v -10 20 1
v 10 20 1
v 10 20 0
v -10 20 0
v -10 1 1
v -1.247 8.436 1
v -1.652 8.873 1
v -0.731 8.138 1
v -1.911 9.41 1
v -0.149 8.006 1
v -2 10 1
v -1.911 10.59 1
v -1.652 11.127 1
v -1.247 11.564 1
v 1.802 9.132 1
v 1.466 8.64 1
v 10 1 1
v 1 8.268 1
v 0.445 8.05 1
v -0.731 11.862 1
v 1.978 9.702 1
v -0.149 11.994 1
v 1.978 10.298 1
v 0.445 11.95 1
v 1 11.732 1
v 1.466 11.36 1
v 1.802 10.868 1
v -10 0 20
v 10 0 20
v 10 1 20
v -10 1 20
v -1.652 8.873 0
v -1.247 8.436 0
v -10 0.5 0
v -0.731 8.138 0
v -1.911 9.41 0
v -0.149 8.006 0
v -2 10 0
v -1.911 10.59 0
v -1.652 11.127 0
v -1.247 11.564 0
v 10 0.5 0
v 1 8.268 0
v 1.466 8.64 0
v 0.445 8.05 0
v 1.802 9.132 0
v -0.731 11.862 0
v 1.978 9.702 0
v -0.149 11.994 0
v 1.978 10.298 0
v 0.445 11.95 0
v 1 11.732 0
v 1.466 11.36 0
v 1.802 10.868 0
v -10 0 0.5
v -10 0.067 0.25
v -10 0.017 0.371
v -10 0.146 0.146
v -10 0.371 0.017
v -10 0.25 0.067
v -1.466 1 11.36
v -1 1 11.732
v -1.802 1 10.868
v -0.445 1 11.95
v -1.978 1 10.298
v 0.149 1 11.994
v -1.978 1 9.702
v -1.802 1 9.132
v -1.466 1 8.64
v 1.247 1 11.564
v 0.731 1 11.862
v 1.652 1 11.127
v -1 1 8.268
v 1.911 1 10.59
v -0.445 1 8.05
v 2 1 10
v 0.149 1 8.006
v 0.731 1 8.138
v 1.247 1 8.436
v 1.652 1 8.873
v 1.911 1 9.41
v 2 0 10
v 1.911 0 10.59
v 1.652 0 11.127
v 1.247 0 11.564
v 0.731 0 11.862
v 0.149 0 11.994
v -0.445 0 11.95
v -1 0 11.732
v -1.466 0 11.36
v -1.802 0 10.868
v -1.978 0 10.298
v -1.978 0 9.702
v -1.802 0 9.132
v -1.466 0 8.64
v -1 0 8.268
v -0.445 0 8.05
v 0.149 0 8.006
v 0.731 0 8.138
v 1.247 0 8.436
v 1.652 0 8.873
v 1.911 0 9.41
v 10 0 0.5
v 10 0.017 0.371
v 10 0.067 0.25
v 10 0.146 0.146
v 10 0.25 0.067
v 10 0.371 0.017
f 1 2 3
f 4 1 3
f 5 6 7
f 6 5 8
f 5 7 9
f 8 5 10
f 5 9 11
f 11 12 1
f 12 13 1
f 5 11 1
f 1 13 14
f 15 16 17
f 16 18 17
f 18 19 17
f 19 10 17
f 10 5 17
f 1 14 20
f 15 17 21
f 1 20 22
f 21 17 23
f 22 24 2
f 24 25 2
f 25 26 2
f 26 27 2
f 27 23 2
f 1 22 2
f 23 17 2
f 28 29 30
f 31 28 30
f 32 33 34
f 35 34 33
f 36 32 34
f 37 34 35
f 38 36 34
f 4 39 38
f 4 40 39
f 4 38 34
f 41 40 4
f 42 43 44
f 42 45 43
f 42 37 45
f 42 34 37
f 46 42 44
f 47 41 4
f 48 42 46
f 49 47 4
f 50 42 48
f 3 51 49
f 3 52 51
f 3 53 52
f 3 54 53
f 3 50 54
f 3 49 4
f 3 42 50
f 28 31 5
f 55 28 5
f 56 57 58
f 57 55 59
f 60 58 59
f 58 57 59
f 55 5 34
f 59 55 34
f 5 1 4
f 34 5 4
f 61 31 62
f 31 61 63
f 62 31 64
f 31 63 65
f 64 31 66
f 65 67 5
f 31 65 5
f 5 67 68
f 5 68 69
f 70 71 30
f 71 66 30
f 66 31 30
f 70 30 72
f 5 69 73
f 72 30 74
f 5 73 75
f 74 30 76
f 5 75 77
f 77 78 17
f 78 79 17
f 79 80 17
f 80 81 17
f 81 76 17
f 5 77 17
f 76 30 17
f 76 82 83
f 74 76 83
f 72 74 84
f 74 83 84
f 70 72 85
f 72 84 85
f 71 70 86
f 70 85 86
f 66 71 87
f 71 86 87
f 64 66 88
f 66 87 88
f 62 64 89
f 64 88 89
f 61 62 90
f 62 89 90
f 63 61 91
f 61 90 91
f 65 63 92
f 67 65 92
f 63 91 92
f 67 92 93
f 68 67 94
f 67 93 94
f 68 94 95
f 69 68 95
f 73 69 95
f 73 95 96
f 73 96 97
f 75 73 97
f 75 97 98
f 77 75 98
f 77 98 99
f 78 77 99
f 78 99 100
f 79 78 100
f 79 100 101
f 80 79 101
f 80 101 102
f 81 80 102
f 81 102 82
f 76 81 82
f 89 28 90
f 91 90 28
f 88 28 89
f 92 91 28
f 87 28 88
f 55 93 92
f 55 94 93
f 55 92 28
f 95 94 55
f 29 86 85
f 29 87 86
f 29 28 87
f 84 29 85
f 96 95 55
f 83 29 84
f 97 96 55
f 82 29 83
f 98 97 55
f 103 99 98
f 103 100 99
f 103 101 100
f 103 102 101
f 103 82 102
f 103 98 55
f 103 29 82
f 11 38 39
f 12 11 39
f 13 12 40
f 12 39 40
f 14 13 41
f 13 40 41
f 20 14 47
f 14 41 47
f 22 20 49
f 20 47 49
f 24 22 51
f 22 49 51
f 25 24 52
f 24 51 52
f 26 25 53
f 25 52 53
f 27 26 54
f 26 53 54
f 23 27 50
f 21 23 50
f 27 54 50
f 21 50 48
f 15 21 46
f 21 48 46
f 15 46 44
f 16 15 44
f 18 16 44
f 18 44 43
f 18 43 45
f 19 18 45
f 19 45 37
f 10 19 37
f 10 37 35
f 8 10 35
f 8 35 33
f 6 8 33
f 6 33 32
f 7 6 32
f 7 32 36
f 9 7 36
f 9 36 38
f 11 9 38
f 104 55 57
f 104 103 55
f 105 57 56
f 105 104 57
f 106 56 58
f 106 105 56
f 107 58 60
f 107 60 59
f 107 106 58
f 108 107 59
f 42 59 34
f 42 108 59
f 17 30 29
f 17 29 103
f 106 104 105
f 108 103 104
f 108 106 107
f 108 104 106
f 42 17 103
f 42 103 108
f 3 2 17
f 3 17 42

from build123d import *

# Parameters (mm, degrees)
SKETCH1_W           = 20
SKETCH1_H           = 20
BOSS_EXTRUDE1_DEPTH = 10
SKETCH3_W           = 19
SKETCH3_H           = 19
CUT_EXTRUDE1_DEPTH  = 20
FILLET1_R           = 0.5
SKETCH4_R           = 2
CUT_EXTRUDE2_DEPTH  = 2
SKETCH5_R           = 2
CUT_EXTRUDE3_DEPTH  = 2


with BuildPart() as part:
    # Sketch1 → Boss-Extrude1 (new body, symmetric)
    with BuildSketch(Plane(origin=(0, 0, 0), x_dir=(0, 0, -1), z_dir=(1, 0, 0))):
        with Locations((-10, 10)):
            Rectangle(SKETCH1_W, SKETCH1_H)
    extrude(amount=BOSS_EXTRUDE1_DEPTH, both=True)

    # Sketch3 → Cut-Extrude1 (cut)
    with BuildSketch(Plane(origin=(10, 0, 0), x_dir=(0, 0, -1), z_dir=(1, 0, 0))):
        with Locations((-10.5, 10.5)):
            Rectangle(SKETCH3_W, SKETCH3_H)
    extrude(amount=-CUT_EXTRUDE1_DEPTH, mode=Mode.SUBTRACT)

    # Fillet1
    fillet1_edges = [part.edges().sort_by_distance(p)[0] for p in [
        (0, 0, 0),
    ]]
    fillet(fillet1_edges, radius=FILLET1_R)

    # Sketch4 → Cut-Extrude2 (cut)
    with BuildSketch(Plane(origin=(0, 0, 0), x_dir=(-1, 0, 0), z_dir=(0, 0, -1))):
        with Locations((0, 10)):
            Circle(SKETCH4_R)
    extrude(amount=-CUT_EXTRUDE2_DEPTH, mode=Mode.SUBTRACT)

    # Sketch5 → Cut-Extrude3 (cut)
    with BuildSketch(Plane.XZ):
        with Locations((0, 10)):
            Circle(SKETCH5_R)
    extrude(amount=-CUT_EXTRUDE3_DEPTH, mode=Mode.SUBTRACT)


solid = part.part
